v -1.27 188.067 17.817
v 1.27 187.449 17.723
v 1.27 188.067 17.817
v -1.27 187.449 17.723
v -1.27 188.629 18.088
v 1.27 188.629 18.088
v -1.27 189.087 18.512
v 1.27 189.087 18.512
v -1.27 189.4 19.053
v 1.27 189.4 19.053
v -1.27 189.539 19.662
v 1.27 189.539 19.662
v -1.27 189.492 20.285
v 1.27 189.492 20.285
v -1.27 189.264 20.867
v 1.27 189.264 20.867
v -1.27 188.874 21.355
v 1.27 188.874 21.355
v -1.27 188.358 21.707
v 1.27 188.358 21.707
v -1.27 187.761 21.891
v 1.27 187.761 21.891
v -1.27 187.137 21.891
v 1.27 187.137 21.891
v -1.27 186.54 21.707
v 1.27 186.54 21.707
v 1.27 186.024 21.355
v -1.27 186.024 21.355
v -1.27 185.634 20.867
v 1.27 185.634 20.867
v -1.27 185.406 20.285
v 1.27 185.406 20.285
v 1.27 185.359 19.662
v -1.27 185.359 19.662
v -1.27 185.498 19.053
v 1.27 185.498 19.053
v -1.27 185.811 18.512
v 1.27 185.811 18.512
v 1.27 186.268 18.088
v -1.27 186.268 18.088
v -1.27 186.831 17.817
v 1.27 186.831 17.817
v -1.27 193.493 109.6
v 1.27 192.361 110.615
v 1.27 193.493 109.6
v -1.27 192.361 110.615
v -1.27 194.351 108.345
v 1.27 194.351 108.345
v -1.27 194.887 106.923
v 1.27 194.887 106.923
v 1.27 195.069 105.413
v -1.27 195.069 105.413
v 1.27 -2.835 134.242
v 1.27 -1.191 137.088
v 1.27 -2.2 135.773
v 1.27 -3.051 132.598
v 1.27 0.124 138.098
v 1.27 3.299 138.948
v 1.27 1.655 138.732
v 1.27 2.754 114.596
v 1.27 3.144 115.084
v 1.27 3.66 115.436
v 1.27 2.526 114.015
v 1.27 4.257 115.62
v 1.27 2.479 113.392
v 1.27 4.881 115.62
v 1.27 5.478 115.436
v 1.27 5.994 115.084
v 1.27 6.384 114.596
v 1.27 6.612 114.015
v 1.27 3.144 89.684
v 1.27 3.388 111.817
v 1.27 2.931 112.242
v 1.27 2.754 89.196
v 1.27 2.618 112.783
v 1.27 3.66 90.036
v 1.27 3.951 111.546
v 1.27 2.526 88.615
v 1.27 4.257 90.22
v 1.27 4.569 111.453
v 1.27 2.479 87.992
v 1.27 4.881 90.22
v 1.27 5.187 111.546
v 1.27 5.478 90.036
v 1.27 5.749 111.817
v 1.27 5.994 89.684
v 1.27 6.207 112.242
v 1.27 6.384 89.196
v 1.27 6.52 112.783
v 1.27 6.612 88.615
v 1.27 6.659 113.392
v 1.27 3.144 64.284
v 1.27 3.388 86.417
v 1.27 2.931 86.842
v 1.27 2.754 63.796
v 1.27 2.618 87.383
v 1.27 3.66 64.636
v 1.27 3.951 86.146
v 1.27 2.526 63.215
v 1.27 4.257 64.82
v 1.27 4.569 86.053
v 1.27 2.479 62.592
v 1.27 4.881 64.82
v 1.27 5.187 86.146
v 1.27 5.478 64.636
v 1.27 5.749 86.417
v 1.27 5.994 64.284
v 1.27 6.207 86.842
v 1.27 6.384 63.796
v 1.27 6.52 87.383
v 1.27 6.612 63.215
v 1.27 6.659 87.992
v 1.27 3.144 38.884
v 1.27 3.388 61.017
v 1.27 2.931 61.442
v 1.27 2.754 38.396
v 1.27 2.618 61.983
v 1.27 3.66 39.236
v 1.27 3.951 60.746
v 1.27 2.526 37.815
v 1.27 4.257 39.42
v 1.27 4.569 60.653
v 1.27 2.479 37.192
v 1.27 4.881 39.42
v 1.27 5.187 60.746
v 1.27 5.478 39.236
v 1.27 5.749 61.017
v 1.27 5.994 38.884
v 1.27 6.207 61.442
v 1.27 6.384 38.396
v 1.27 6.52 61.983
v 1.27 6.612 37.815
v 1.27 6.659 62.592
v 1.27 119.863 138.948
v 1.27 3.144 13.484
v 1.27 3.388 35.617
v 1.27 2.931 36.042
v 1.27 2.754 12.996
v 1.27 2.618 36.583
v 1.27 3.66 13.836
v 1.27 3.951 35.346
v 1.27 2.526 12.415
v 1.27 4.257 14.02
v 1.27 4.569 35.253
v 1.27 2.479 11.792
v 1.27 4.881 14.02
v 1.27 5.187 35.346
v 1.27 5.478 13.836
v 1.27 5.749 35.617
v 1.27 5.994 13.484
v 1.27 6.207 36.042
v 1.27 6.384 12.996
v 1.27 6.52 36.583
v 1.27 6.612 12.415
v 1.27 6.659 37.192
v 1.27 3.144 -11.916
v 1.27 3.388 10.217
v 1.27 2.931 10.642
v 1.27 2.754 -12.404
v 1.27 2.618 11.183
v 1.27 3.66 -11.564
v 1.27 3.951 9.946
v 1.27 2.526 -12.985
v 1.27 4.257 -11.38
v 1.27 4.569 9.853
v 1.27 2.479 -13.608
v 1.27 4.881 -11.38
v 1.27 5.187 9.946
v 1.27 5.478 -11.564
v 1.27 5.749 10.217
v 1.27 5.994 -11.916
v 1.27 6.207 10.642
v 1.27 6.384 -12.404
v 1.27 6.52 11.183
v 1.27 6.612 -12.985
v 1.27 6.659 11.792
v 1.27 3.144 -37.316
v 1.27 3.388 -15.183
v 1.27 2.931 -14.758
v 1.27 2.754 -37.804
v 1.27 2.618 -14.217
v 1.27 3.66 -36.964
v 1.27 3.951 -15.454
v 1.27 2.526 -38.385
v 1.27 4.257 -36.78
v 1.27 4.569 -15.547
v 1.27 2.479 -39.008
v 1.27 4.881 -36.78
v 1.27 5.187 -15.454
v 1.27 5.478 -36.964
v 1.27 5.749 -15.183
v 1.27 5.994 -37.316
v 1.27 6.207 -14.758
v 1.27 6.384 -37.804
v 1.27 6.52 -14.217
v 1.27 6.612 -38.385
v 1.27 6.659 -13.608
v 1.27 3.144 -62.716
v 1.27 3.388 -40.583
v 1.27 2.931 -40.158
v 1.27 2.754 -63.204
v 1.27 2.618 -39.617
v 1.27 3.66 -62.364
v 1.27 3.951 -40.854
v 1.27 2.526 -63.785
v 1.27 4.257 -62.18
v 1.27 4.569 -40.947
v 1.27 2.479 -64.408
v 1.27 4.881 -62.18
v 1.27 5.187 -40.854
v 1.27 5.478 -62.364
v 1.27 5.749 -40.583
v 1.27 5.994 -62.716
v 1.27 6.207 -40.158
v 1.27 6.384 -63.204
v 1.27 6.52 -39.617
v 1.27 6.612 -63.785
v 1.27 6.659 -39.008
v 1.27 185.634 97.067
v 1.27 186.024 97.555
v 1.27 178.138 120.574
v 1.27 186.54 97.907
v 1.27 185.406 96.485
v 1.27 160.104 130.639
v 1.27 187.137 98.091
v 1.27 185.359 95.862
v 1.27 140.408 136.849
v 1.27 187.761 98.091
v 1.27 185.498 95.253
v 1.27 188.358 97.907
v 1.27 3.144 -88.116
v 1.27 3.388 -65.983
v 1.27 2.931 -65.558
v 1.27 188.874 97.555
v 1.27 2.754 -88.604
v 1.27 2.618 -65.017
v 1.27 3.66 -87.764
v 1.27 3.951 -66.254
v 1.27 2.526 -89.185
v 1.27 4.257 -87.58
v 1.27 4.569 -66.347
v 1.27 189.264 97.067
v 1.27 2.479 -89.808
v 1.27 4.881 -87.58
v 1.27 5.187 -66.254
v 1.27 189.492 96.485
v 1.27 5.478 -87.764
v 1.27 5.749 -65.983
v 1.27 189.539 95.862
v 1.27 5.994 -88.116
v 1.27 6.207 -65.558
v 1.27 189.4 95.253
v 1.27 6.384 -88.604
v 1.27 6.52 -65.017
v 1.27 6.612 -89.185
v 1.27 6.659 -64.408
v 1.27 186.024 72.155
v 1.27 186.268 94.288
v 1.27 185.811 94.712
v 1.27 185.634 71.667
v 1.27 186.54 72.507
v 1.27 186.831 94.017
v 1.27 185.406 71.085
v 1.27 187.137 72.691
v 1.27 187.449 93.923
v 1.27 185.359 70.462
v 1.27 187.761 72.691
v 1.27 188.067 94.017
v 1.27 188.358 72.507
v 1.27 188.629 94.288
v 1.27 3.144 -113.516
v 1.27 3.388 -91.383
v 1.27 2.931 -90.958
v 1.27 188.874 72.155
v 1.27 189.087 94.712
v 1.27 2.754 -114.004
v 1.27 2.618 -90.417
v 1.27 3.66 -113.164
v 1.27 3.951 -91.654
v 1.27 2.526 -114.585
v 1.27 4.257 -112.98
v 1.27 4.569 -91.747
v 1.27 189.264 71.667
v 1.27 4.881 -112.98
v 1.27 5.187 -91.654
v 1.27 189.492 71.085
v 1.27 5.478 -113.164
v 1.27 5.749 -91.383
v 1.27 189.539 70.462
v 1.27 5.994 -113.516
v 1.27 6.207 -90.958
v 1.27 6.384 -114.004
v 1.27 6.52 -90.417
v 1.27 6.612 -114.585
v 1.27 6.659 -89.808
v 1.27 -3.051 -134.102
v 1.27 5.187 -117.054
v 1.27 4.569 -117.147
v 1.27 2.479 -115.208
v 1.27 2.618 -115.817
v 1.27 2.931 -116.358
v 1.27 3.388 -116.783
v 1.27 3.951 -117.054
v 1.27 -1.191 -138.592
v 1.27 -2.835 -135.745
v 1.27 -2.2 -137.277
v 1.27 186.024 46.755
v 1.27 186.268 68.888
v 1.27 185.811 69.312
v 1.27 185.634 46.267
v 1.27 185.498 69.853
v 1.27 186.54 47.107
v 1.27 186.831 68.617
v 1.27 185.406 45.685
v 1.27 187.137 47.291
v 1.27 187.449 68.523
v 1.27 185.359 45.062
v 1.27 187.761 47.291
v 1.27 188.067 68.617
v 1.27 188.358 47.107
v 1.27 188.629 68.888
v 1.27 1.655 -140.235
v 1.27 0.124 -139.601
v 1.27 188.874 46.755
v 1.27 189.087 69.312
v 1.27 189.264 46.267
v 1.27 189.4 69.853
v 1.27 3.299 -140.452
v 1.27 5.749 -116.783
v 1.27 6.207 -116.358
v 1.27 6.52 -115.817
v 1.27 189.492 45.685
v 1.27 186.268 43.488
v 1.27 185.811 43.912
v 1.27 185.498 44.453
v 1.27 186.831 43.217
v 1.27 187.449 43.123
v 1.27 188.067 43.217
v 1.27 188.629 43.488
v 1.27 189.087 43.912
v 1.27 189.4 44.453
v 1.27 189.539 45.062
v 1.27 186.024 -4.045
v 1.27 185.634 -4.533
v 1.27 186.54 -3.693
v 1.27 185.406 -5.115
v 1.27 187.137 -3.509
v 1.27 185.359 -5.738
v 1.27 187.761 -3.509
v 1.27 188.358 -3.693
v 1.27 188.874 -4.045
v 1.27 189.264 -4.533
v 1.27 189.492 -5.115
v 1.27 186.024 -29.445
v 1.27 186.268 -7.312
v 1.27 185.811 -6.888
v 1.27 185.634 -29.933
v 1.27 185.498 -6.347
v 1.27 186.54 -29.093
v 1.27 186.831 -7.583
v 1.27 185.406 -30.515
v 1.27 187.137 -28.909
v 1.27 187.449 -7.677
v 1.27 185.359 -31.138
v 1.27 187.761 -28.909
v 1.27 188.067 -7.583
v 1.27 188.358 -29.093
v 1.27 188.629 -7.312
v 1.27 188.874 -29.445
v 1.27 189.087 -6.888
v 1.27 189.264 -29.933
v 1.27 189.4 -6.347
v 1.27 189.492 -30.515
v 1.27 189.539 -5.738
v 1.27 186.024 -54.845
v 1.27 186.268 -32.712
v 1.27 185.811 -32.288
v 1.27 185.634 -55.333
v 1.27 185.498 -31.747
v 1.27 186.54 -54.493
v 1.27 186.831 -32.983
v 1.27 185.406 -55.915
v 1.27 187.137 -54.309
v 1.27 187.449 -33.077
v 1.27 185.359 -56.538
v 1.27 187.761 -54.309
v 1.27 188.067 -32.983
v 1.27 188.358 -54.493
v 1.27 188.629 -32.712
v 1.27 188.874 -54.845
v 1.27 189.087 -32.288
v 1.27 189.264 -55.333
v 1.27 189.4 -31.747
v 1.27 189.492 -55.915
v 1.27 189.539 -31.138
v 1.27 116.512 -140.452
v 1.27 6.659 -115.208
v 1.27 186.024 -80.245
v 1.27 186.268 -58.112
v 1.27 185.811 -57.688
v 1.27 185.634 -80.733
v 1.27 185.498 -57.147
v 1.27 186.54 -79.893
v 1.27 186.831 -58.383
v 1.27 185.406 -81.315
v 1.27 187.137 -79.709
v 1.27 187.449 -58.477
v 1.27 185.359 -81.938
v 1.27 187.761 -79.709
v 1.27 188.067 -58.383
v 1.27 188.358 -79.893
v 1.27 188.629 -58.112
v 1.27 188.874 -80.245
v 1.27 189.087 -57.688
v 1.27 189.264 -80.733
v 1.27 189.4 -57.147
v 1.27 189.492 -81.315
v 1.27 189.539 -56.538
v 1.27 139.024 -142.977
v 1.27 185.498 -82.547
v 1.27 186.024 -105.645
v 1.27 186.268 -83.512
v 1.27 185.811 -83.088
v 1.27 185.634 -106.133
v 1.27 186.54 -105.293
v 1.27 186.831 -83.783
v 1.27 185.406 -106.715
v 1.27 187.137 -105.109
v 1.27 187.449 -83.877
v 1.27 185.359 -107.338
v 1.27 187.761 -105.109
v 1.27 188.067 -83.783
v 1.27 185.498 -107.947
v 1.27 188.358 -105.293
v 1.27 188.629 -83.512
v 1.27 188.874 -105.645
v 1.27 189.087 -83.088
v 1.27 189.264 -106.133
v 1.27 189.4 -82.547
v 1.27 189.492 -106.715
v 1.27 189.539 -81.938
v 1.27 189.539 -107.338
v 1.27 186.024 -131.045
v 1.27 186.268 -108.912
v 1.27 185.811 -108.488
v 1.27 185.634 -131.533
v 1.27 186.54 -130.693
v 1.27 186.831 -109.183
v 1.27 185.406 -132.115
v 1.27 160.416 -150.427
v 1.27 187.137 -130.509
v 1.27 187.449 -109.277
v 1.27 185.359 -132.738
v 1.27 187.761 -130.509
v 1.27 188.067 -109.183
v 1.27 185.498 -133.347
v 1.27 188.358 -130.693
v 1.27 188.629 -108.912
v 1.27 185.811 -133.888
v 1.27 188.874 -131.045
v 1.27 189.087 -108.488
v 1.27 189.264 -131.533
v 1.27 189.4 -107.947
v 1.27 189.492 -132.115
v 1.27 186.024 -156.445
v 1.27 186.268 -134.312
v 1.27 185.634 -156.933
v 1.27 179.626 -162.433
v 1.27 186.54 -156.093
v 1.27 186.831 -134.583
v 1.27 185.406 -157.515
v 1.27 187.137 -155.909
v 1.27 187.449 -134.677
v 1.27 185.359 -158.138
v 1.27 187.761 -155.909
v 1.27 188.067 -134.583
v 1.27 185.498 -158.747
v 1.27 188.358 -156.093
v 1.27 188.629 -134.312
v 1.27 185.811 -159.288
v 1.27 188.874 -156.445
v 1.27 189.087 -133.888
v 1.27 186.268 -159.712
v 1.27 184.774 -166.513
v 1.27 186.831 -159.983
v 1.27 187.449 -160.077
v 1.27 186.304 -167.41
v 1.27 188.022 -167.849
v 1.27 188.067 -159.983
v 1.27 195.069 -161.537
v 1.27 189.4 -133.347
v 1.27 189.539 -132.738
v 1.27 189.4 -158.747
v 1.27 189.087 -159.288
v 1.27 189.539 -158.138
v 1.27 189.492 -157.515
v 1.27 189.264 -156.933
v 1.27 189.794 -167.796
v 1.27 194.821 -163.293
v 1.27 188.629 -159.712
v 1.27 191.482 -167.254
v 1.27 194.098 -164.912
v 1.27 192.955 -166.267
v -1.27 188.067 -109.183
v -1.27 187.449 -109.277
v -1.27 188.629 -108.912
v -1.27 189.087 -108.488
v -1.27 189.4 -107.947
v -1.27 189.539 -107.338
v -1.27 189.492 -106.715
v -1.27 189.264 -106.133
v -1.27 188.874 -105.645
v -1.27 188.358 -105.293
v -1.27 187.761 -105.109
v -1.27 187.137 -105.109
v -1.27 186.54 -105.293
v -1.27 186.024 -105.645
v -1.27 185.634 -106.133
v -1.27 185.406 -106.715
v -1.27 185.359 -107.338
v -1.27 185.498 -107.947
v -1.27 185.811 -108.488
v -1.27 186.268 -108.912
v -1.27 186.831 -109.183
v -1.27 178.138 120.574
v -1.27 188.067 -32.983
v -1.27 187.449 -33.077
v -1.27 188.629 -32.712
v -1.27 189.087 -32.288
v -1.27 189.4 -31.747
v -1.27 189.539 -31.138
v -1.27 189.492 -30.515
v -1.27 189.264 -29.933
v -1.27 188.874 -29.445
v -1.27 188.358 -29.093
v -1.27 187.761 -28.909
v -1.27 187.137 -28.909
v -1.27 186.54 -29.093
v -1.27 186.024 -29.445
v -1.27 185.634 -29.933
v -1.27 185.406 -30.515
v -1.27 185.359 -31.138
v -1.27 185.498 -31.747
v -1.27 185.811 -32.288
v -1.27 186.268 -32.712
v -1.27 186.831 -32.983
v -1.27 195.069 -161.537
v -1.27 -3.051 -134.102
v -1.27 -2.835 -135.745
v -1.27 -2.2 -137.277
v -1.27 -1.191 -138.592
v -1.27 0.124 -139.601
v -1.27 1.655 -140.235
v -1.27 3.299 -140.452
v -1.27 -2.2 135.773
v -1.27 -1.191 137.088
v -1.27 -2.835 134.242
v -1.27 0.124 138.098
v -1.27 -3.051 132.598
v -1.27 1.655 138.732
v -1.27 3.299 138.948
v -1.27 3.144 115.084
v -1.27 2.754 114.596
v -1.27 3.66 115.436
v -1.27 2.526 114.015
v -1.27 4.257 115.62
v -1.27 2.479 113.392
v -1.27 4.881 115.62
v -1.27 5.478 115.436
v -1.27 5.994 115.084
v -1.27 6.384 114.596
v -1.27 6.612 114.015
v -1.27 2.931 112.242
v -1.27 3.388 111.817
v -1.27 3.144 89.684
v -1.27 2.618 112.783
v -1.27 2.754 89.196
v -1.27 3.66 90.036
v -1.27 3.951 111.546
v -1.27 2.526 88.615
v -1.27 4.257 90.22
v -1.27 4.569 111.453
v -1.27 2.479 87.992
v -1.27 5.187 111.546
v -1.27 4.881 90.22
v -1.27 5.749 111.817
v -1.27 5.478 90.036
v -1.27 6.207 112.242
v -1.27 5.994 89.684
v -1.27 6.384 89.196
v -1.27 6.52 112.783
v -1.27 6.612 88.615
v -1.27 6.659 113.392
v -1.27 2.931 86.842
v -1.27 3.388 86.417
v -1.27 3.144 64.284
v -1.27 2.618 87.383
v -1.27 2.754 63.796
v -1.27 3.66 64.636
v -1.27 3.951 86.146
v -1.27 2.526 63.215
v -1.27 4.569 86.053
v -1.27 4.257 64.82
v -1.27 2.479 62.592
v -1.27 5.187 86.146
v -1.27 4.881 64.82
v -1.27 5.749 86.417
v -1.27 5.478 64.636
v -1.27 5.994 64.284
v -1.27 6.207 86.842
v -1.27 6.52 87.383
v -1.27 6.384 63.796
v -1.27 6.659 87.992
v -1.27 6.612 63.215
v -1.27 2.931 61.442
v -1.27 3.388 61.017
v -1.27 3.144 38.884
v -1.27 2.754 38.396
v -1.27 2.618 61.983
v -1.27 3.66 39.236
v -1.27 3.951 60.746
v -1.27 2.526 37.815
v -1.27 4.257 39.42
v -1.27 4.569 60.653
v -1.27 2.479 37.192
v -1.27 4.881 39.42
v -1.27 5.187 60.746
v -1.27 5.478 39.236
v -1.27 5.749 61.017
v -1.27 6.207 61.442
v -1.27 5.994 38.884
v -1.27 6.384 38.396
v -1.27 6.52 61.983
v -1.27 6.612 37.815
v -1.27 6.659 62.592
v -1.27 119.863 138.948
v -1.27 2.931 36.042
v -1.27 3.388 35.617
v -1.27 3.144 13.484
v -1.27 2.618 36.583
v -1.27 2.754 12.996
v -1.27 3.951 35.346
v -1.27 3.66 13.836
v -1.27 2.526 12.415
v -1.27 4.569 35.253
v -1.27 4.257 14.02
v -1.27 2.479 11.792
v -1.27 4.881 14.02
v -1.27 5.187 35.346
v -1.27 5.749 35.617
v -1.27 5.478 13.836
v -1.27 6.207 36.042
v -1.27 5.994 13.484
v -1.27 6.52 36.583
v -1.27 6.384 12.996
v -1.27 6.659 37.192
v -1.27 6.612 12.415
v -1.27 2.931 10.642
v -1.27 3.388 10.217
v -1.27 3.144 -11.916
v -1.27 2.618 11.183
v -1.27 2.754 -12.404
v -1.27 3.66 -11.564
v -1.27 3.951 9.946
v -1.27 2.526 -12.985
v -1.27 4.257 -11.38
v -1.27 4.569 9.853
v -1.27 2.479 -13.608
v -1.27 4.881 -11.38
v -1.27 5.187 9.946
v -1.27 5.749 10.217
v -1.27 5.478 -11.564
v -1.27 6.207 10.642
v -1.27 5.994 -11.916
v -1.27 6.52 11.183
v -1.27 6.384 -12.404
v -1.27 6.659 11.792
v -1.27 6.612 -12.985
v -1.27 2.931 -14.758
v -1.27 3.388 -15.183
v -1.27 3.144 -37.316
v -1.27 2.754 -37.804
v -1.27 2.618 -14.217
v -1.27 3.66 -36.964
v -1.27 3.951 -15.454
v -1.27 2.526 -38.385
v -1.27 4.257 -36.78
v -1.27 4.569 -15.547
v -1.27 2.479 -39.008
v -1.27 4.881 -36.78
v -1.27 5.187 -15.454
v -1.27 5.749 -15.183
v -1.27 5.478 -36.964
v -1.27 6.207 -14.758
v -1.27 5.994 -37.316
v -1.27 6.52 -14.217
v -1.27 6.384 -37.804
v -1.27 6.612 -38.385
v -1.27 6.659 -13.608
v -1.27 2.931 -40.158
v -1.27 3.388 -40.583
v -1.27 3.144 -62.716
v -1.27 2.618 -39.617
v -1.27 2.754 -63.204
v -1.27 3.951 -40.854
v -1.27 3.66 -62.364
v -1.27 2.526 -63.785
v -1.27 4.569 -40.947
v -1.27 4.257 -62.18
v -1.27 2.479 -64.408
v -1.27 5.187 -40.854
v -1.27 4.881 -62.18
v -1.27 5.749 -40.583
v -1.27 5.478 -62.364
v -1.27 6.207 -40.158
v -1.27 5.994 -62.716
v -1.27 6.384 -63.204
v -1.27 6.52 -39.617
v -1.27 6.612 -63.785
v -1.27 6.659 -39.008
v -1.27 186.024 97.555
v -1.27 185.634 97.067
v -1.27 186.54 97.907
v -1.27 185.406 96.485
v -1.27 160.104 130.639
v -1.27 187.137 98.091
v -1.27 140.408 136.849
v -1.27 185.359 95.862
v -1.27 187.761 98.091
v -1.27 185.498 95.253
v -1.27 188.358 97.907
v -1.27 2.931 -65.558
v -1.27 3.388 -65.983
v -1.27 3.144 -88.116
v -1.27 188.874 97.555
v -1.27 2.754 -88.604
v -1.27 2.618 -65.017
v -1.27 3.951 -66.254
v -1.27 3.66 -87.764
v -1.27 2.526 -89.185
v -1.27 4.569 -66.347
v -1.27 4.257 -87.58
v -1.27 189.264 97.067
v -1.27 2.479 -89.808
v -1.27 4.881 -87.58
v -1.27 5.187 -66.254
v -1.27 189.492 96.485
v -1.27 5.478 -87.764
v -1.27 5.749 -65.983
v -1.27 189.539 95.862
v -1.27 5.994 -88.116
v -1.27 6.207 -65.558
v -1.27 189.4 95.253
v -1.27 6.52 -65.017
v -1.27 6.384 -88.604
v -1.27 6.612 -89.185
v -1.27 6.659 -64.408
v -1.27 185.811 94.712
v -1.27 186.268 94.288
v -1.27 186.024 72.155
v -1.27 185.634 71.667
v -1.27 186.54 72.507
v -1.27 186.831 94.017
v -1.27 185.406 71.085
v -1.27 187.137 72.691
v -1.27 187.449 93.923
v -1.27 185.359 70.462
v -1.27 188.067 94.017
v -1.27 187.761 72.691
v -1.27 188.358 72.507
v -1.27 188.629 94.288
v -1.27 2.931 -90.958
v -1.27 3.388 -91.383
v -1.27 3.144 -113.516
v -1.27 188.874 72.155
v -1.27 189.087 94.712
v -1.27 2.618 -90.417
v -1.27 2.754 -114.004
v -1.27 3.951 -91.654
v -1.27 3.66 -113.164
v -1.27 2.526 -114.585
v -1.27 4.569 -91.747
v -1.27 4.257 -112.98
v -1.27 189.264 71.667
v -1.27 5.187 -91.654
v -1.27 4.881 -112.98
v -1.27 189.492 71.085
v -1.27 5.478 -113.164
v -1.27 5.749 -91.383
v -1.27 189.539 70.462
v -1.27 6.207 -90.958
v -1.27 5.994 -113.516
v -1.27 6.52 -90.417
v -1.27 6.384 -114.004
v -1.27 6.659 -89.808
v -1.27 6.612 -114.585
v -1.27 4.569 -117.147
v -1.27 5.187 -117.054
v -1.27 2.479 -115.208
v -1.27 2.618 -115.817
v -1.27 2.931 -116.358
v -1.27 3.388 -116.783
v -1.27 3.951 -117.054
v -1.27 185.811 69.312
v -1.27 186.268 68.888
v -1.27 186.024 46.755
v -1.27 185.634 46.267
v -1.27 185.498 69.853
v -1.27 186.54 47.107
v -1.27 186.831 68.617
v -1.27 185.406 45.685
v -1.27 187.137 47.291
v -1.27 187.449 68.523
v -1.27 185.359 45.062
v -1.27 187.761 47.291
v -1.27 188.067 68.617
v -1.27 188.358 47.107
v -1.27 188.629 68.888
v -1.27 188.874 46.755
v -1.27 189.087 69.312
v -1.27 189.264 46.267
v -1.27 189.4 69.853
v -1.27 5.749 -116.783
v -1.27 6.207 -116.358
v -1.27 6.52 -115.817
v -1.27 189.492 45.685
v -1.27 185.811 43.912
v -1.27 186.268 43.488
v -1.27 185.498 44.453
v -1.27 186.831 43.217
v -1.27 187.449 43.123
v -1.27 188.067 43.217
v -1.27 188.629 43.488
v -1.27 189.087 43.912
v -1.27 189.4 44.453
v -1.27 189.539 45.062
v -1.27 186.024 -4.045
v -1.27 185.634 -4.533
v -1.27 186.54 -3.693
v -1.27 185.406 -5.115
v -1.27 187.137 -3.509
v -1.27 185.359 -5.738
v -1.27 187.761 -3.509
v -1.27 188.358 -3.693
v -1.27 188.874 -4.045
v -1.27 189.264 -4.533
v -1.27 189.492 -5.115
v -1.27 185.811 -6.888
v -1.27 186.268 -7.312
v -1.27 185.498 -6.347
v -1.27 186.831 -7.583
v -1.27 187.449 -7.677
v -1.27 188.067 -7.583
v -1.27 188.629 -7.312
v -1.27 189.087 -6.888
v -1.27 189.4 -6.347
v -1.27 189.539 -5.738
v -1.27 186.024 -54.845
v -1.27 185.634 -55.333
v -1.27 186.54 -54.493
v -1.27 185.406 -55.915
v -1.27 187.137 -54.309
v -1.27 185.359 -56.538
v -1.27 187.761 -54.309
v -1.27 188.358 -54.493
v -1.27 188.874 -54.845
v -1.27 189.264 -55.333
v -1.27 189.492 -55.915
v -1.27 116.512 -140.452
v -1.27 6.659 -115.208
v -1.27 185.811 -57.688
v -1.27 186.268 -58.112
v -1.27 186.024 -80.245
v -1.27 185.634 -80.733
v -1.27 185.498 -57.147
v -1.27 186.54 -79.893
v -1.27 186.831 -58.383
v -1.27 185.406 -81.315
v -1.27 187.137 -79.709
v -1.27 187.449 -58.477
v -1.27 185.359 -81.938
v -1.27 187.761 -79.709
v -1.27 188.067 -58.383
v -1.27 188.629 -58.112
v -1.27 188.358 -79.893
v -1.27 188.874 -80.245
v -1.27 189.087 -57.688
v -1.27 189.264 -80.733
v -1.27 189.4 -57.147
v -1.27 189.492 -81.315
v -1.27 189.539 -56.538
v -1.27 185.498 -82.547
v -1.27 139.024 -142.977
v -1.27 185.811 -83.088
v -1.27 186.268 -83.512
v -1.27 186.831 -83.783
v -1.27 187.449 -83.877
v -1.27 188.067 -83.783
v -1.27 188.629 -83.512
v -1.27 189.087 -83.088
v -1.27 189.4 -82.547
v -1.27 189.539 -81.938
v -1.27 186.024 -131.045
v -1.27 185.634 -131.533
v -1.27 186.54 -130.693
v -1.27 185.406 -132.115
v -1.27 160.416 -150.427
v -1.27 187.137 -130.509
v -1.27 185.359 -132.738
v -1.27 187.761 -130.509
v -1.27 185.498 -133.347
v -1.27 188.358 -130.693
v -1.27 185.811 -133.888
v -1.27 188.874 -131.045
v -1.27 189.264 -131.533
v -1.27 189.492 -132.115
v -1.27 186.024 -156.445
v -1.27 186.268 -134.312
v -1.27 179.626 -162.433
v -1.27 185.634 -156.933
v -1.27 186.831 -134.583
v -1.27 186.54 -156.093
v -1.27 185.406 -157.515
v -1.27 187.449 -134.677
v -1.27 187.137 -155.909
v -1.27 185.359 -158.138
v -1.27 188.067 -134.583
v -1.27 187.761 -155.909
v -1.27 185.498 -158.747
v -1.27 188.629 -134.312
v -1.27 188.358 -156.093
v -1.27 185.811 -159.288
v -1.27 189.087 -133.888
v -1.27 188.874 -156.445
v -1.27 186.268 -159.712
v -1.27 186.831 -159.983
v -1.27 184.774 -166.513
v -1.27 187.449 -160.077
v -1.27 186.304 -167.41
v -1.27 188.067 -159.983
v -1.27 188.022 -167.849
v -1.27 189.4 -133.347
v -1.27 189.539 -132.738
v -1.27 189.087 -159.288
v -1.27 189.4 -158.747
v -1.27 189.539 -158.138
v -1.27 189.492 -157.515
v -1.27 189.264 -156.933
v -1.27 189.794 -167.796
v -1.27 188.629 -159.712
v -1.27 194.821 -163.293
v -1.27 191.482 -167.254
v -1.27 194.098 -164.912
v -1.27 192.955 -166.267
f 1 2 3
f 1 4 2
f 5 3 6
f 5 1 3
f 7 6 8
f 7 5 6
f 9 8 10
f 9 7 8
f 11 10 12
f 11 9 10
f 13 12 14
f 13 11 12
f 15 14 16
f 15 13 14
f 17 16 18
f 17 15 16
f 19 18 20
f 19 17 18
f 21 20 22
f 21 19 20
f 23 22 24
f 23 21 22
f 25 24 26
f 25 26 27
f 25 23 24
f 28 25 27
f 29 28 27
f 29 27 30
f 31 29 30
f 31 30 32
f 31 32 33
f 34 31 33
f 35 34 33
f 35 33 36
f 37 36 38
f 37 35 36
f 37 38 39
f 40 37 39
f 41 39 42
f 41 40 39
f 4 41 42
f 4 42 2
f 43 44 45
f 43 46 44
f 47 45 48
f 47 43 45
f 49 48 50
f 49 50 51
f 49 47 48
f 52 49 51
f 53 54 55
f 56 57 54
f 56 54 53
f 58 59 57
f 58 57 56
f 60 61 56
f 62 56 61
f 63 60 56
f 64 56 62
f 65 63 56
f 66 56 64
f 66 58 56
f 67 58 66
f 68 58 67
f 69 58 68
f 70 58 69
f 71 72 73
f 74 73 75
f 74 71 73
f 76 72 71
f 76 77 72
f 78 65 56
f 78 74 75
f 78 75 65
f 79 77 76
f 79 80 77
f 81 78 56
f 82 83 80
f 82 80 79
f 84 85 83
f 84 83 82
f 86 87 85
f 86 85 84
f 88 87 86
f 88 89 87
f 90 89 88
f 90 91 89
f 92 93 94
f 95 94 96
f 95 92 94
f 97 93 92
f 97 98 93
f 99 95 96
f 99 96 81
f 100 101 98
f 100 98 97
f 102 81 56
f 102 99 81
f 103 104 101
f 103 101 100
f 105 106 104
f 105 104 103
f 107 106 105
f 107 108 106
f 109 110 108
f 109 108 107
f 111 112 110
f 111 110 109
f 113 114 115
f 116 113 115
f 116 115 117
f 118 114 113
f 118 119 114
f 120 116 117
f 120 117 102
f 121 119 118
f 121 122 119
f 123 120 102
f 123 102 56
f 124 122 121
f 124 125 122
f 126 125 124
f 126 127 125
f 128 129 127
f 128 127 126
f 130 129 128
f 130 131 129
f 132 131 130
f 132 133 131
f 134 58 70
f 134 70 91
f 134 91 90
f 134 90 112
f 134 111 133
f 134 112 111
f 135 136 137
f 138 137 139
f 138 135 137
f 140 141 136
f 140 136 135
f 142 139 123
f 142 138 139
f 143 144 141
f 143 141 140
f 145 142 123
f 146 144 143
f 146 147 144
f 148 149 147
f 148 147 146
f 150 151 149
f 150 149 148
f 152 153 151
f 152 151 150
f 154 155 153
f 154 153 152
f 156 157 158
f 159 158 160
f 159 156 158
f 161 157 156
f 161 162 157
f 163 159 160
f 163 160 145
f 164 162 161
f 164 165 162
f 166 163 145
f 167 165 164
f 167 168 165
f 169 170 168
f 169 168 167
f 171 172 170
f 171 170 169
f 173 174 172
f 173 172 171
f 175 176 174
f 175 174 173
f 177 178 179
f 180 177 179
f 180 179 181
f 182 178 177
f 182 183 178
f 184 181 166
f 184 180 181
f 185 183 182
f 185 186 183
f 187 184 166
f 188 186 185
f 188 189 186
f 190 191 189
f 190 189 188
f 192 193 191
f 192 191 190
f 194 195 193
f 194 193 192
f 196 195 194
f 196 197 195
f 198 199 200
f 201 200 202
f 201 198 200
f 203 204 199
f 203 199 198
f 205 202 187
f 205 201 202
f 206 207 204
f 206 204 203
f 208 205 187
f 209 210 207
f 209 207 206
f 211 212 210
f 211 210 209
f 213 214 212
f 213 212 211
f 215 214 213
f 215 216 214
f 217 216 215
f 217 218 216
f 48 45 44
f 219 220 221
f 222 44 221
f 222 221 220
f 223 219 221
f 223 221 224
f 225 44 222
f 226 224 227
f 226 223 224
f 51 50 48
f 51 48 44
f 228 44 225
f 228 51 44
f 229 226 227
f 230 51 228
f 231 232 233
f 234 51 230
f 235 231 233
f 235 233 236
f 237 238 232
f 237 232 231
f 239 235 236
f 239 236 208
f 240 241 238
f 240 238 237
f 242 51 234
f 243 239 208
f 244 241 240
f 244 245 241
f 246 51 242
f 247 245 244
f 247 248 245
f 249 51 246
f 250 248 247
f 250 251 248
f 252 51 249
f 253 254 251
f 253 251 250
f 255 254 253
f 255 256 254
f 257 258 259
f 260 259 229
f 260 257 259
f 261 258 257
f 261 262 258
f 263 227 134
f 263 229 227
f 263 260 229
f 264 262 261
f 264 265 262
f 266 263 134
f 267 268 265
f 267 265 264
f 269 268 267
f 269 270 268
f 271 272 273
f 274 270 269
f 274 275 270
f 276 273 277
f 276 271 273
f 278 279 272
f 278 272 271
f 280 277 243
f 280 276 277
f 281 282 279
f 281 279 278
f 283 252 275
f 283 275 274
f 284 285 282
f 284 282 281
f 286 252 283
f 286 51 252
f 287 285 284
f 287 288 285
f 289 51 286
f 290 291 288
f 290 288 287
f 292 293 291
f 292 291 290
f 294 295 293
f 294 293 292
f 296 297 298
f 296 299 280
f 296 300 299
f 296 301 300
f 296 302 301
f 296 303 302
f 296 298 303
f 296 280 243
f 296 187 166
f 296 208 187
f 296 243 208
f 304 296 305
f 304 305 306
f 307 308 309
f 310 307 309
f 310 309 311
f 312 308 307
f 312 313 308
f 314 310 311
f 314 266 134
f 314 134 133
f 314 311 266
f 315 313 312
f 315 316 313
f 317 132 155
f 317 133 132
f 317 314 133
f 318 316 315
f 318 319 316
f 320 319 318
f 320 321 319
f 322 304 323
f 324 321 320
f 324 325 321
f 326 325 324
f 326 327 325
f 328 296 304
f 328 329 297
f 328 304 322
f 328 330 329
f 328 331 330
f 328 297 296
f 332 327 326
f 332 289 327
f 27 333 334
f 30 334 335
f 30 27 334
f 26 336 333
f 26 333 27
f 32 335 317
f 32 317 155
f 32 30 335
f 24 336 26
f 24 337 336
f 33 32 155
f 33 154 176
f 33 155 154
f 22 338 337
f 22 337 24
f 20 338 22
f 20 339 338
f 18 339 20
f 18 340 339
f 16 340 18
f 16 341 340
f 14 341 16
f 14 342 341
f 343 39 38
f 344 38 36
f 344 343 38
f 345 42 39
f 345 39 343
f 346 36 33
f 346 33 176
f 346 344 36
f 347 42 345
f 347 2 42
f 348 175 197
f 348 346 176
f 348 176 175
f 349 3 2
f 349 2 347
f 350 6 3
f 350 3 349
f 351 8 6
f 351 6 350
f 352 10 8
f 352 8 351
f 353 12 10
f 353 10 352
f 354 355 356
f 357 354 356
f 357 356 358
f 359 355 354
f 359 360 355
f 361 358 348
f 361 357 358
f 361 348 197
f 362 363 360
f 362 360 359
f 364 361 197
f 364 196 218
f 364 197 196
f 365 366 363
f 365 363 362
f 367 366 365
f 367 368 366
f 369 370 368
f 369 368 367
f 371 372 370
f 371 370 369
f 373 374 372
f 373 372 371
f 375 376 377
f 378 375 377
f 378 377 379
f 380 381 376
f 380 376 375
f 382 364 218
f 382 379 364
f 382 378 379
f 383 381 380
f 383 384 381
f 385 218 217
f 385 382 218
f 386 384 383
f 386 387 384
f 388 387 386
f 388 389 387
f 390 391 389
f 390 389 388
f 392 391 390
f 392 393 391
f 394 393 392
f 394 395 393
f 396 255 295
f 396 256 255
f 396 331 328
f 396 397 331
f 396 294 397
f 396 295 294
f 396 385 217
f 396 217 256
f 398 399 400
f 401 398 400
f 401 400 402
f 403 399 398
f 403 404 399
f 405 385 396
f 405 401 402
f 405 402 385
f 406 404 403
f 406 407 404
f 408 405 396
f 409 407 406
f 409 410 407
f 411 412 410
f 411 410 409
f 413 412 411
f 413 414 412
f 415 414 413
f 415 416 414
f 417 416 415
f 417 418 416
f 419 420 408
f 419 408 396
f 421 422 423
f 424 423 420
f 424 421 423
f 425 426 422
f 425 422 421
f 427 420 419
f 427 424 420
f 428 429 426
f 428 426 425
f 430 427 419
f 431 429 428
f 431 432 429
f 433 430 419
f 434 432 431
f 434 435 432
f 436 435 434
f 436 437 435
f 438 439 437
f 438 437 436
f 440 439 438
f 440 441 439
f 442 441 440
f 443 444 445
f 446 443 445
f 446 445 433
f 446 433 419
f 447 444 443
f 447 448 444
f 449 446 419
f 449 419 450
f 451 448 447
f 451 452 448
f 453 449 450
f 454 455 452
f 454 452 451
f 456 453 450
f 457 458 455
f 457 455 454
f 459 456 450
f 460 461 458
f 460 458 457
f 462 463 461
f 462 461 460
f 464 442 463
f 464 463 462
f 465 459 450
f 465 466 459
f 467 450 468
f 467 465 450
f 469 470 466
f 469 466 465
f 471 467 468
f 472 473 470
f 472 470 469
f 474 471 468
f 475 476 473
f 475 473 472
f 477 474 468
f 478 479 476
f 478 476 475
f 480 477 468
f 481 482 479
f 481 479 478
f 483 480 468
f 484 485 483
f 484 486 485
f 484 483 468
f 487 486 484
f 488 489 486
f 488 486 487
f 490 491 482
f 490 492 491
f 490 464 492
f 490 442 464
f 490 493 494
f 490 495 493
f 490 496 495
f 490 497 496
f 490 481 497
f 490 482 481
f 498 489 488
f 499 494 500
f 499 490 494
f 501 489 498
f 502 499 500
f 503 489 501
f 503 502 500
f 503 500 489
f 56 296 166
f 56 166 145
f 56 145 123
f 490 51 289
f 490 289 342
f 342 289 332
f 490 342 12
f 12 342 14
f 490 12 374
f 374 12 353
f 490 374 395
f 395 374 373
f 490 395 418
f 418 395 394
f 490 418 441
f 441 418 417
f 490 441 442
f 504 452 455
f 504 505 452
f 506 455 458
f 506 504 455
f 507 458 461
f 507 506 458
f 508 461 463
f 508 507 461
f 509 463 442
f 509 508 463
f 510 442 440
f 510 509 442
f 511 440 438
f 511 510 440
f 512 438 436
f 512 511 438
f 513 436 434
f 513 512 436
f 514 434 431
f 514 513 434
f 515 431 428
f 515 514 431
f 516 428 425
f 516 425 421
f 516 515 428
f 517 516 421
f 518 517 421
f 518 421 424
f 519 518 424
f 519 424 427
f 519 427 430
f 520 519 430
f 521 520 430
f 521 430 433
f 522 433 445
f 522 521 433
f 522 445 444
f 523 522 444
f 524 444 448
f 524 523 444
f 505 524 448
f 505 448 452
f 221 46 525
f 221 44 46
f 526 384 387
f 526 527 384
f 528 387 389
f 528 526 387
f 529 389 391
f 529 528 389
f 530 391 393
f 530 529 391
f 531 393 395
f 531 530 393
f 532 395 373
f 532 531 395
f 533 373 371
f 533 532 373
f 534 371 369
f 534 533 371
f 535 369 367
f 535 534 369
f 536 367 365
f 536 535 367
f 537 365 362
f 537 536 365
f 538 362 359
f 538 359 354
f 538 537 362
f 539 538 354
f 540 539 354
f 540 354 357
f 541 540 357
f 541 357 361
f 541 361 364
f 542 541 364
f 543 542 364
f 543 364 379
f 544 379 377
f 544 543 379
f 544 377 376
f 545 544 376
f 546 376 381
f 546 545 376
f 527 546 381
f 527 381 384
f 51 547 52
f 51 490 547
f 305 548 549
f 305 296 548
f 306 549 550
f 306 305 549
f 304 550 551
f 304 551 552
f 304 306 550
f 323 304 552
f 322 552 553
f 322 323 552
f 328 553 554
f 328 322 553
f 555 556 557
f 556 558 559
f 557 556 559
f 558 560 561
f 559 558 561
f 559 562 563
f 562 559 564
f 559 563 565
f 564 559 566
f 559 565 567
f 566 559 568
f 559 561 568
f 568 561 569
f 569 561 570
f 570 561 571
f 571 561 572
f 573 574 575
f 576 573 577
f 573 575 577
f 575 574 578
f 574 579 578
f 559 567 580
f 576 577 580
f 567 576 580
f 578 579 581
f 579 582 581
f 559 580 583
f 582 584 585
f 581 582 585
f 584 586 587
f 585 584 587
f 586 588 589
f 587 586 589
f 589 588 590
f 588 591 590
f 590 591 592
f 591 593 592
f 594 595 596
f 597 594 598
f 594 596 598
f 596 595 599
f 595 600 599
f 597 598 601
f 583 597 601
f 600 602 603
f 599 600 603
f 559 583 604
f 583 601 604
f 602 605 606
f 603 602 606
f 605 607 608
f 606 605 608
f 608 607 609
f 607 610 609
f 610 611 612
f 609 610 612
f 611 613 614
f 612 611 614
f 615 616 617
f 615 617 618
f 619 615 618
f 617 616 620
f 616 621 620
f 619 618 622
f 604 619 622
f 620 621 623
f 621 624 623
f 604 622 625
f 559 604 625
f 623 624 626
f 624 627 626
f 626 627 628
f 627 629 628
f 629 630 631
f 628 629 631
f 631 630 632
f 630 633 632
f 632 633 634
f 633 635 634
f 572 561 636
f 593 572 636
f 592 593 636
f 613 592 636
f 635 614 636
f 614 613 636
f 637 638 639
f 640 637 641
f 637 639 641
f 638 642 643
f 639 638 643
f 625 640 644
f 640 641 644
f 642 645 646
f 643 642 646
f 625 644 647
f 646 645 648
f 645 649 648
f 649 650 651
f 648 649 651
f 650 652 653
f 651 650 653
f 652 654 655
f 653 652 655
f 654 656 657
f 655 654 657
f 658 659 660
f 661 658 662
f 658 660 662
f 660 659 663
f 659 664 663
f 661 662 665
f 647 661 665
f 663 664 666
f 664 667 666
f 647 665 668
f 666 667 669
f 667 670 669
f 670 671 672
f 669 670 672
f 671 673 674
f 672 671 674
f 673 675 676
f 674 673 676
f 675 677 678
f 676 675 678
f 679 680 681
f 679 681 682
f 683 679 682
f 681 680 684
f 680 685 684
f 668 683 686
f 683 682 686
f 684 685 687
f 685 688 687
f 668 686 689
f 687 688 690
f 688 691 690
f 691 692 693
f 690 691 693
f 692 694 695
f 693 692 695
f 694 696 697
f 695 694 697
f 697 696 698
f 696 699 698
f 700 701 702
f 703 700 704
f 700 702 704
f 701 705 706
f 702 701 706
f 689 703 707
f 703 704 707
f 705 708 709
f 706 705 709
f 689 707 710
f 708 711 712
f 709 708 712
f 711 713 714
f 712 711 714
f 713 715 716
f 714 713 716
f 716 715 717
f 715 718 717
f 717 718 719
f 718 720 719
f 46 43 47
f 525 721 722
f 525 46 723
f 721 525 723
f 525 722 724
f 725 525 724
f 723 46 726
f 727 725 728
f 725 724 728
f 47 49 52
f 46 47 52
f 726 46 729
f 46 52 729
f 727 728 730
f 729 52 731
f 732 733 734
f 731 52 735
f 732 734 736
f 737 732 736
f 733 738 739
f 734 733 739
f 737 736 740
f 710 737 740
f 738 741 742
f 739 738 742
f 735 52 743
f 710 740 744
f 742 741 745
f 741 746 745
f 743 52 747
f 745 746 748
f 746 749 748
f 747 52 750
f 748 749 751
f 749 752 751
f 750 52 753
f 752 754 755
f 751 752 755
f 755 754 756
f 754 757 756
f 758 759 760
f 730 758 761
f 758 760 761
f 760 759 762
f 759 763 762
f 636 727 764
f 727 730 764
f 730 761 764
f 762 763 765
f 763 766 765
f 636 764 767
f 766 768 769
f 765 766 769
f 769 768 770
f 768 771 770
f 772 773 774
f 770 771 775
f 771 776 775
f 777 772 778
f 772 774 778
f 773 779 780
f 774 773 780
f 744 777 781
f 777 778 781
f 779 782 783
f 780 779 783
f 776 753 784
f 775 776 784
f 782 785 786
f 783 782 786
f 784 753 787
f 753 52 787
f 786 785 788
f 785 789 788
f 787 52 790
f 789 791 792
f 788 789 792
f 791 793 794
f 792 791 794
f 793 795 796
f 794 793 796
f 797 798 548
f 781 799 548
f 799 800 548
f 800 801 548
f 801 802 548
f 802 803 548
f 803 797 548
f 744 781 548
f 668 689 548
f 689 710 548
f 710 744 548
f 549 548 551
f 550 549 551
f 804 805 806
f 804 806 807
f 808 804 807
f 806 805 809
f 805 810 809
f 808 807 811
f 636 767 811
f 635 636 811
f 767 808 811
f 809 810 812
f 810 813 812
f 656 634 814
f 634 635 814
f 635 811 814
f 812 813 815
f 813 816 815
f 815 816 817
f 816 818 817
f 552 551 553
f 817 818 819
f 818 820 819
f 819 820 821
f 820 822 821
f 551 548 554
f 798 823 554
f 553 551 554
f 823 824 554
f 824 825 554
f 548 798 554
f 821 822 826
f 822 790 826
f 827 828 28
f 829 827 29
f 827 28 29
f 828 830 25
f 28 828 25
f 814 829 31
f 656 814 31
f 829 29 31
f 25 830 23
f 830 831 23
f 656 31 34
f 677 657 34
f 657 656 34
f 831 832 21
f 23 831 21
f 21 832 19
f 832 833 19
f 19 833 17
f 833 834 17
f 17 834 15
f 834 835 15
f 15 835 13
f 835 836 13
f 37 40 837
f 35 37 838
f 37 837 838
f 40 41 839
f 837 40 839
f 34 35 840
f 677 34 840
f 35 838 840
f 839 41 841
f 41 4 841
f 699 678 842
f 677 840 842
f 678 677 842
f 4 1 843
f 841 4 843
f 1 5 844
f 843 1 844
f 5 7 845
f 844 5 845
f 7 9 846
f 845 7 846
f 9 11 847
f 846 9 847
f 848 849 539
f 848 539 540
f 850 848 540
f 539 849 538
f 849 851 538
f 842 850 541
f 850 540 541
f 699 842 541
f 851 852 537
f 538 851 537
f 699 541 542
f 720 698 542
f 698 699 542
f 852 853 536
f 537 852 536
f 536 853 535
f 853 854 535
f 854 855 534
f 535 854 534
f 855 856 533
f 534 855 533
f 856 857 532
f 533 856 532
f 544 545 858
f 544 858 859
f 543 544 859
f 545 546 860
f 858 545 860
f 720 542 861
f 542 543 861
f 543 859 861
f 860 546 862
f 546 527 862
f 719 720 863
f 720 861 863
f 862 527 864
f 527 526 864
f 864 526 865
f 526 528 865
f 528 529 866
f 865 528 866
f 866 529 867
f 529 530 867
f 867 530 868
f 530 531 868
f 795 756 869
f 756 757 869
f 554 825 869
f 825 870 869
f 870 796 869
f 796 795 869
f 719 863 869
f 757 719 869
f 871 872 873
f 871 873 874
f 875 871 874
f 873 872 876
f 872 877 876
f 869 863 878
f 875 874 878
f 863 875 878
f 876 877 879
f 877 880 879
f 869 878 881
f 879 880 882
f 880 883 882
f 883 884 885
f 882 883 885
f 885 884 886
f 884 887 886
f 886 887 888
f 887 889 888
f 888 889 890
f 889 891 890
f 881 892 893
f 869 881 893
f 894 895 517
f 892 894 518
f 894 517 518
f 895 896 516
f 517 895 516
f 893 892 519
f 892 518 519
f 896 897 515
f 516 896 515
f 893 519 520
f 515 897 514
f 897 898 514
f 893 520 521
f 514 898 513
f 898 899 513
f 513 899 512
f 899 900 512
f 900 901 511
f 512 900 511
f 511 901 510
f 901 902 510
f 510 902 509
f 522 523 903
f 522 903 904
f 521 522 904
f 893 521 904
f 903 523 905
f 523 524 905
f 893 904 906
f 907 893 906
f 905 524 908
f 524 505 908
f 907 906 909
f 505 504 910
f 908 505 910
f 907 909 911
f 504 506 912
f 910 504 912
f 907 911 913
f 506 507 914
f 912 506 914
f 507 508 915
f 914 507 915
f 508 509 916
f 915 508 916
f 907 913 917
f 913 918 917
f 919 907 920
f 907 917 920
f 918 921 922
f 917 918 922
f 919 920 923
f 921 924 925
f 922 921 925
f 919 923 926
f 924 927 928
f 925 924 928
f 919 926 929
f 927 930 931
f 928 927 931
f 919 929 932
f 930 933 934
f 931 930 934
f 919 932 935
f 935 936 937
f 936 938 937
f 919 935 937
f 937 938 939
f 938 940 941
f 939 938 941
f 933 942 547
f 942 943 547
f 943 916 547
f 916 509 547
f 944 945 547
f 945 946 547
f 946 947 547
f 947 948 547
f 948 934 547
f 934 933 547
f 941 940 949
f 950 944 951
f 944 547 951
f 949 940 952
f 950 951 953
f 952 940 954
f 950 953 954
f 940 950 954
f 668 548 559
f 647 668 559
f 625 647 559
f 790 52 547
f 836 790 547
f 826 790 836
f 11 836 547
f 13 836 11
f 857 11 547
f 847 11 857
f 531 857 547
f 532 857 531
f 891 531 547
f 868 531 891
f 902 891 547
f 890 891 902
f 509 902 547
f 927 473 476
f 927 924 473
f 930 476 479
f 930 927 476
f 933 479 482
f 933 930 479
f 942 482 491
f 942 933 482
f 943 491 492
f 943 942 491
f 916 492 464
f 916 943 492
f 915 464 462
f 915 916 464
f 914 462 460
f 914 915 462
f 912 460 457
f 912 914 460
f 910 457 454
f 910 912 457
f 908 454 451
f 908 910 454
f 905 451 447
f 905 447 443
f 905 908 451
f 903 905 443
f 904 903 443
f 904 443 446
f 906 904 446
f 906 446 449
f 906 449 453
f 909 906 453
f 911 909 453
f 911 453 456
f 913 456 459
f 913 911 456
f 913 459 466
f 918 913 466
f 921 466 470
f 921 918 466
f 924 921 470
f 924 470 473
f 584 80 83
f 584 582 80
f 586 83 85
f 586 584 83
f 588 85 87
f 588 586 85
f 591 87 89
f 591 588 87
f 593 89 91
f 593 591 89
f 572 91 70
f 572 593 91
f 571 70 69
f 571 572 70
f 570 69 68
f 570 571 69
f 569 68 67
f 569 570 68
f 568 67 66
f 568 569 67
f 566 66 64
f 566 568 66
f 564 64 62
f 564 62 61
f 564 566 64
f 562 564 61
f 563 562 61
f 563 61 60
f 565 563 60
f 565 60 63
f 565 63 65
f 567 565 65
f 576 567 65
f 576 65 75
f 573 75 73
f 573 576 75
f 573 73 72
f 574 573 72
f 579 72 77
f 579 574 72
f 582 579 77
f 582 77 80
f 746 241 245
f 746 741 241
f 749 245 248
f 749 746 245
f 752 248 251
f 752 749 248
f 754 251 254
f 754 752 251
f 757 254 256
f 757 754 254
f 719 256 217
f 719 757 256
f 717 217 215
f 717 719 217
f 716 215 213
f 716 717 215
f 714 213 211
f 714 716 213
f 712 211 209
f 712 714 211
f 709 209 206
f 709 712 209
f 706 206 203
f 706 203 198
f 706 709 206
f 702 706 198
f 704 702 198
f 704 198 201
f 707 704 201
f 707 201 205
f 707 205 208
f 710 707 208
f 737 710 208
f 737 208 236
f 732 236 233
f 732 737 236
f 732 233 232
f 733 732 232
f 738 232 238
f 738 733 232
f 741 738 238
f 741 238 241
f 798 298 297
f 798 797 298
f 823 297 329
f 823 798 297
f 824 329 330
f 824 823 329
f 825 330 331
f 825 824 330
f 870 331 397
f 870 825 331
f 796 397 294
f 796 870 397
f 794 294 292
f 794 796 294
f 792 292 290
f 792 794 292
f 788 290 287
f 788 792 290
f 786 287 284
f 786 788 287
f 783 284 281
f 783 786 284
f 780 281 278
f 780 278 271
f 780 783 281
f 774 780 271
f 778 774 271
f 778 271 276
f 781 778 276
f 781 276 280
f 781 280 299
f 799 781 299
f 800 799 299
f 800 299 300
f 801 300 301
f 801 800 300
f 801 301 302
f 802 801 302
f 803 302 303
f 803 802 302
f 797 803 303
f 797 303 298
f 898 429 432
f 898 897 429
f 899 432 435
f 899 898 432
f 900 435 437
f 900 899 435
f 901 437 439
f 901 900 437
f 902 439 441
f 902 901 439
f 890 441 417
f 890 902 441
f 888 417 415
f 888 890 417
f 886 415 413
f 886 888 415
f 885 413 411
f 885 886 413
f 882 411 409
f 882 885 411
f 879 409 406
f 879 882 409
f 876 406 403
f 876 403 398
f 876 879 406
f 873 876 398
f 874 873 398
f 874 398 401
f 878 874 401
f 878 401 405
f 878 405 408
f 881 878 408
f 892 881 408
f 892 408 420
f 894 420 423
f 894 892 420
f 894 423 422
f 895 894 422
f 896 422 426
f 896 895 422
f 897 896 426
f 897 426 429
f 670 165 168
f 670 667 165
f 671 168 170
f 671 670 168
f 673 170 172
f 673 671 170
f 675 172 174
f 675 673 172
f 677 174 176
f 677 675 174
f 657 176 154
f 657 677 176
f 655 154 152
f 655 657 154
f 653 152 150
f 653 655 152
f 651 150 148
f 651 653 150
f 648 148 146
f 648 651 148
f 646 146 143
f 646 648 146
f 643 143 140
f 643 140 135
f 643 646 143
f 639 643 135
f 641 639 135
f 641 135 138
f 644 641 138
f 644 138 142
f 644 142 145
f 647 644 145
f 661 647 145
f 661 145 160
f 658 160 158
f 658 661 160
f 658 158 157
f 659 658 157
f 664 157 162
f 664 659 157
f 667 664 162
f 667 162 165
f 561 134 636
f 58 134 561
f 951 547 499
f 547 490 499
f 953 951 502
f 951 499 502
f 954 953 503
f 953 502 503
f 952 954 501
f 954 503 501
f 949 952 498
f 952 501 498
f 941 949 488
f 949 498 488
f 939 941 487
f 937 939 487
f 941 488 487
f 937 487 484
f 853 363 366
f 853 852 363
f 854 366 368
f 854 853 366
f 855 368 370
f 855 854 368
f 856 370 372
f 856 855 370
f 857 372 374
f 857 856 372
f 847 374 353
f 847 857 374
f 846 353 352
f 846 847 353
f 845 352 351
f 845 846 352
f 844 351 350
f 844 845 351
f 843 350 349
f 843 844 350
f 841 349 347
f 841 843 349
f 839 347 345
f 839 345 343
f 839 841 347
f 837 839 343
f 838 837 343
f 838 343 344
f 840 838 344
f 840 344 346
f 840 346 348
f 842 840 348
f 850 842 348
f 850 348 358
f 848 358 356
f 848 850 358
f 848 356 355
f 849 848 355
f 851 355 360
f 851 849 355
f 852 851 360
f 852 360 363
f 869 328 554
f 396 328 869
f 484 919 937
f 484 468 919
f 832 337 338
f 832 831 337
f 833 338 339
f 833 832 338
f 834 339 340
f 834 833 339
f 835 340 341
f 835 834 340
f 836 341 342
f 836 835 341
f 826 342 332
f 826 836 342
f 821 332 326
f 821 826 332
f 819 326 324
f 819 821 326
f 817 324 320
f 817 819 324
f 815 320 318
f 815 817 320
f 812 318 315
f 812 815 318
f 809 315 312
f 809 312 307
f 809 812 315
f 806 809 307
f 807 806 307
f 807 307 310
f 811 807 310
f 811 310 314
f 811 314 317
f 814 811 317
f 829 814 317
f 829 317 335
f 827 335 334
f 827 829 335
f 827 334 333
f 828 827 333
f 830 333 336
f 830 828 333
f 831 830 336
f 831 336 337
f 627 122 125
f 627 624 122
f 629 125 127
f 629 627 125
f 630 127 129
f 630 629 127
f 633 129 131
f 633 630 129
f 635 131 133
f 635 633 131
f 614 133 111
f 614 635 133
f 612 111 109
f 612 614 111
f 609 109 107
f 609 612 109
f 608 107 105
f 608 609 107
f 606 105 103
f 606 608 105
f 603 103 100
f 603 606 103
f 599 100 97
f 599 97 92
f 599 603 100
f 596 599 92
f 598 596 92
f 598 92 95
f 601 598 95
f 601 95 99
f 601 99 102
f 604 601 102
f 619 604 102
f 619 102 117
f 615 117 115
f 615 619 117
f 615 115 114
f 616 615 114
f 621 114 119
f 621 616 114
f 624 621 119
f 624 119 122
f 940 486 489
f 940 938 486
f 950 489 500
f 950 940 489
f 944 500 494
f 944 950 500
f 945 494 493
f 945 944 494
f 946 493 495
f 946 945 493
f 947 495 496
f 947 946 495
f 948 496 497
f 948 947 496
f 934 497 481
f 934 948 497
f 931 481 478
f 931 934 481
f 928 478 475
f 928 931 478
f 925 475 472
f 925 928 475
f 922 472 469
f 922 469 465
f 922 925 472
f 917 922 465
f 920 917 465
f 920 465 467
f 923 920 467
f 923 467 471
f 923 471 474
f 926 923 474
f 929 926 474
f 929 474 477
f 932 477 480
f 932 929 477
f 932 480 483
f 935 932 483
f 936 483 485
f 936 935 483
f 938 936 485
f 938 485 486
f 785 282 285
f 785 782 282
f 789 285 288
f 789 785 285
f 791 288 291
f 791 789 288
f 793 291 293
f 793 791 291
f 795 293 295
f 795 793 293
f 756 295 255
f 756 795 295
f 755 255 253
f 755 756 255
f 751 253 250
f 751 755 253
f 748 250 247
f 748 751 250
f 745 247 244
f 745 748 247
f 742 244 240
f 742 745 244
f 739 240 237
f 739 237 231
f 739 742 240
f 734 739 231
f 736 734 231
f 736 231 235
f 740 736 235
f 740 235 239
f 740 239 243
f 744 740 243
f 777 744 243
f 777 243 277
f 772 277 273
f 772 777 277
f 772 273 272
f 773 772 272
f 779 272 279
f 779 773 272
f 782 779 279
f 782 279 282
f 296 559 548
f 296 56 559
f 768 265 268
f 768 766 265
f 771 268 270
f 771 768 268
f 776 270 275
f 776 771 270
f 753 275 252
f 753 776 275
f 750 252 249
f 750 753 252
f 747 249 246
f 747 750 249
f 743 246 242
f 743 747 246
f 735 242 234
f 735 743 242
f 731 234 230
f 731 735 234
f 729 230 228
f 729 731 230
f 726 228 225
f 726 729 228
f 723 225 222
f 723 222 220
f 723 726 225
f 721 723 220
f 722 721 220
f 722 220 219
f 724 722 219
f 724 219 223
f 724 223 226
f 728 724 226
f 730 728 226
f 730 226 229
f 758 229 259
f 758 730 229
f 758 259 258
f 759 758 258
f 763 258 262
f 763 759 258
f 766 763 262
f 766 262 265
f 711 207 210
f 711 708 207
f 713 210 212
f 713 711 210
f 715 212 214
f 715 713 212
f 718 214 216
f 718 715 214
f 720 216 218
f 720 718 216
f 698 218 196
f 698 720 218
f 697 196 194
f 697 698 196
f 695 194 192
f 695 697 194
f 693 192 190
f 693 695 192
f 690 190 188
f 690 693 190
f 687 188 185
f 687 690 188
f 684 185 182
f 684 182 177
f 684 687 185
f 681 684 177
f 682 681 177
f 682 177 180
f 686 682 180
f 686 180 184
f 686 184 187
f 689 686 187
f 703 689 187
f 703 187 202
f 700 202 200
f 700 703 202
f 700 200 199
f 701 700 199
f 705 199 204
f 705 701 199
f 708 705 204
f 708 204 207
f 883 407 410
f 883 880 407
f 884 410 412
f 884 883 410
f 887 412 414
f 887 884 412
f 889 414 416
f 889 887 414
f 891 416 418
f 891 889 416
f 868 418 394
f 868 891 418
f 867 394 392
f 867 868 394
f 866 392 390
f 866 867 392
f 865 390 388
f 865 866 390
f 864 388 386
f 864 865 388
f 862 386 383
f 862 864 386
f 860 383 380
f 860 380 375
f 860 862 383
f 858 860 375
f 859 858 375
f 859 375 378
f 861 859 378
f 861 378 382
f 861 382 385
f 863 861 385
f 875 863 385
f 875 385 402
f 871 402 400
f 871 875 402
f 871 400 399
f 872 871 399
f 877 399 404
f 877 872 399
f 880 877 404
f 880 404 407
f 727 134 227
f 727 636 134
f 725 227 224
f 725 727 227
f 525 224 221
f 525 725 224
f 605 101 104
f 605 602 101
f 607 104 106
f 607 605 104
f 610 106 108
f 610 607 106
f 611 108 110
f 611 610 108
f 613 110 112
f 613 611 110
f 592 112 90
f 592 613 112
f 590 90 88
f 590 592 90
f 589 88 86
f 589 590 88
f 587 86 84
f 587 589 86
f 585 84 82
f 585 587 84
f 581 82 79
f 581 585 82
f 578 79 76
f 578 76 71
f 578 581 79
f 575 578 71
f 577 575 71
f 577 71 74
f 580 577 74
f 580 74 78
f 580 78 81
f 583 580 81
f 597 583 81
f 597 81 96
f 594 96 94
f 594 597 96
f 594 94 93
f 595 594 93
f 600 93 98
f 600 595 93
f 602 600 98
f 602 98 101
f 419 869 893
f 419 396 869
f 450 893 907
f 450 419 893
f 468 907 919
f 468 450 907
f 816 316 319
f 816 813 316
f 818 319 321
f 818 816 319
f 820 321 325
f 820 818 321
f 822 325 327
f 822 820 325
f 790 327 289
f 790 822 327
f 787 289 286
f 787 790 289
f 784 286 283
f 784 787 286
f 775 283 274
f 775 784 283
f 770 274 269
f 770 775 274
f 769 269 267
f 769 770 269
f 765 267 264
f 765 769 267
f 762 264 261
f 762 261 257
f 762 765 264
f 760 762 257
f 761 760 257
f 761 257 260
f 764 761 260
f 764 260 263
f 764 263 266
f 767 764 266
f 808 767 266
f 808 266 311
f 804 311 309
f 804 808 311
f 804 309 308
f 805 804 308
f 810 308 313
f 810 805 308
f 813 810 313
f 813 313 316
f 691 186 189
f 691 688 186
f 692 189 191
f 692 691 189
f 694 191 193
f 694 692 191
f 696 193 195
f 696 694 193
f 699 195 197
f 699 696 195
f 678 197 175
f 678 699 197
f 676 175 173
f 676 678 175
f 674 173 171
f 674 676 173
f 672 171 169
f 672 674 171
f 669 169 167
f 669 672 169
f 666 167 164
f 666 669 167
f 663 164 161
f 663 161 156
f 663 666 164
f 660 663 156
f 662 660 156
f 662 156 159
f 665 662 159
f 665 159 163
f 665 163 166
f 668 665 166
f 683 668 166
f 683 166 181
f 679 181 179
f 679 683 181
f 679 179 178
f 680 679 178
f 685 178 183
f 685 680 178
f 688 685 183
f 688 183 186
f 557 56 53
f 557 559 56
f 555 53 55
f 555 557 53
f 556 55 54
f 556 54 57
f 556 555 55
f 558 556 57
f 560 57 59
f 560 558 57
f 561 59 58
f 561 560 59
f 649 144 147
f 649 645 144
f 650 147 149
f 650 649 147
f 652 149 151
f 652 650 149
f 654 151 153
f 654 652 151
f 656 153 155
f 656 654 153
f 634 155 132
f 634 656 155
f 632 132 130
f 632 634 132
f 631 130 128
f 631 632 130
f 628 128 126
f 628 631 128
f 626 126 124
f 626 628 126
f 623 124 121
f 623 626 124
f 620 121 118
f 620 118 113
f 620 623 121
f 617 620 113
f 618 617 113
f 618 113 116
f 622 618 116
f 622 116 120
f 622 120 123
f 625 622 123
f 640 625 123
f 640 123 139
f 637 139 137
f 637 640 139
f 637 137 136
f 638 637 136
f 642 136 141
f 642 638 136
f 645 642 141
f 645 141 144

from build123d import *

# Parameters (mm, degrees)
SKETCH1_R           = 2.0955
BOSS_EXTRUDE1_DEPTH = 1.27
FILLET1_R           = 6.35
FILLET2_R           = 101.6


with BuildPart() as part:
    # Sketch1 → Boss-Extrude1 (new, symmetric)
    with BuildSketch(Plane(origin=(0, 0, 0), x_dir=(0, 0, -1), z_dir=(1, 0, 0))):
        Polygon((-138.948360469, -3.051094372), (140.451639531, -3.051094372), (140.451639531, 151.896865158), (174.673969175, 195.068905628), (-108.718972293, 195.068905628), (-138.948360469, 151.896865158), align=None)
        with Locations((-113.548360469, 4.568905628)):
            Circle(SKETCH1_R, mode=Mode.SUBTRACT)
        with Locations((-88.148360469, 4.568905628)):
            Circle(SKETCH1_R, mode=Mode.SUBTRACT)
        with Locations((-62.748360469, 4.568905628)):
            Circle(SKETCH1_R, mode=Mode.SUBTRACT)
        with Locations((-37.348360469, 4.568905628)):
            Circle(SKETCH1_R, mode=Mode.SUBTRACT)
        with Locations((-11.948360469, 4.568905628)):
            Circle(SKETCH1_R, mode=Mode.SUBTRACT)
        with Locations((13.451639531, 4.568905628)):
            Circle(SKETCH1_R, mode=Mode.SUBTRACT)
        with Locations((38.851639531, 4.568905628)):
            Circle(SKETCH1_R, mode=Mode.SUBTRACT)
        with Locations((64.251639531, 4.568905628)):
            Circle(SKETCH1_R, mode=Mode.SUBTRACT)
        with Locations((89.651639531, 4.568905628)):
            Circle(SKETCH1_R, mode=Mode.SUBTRACT)
        with Locations((115.051639531, 4.568905628)):
            Circle(SKETCH1_R, mode=Mode.SUBTRACT)
        with Locations((-96.018972293, 187.448905628)):
            Circle(SKETCH1_R, mode=Mode.SUBTRACT)
        with Locations((-70.618972293, 187.448905628)):
            Circle(SKETCH1_R, mode=Mode.SUBTRACT)
        with Locations((-45.218972293, 187.448905628)):
            Circle(SKETCH1_R, mode=Mode.SUBTRACT)
        with Locations((-19.818972293, 187.448905628)):
            Circle(SKETCH1_R, mode=Mode.SUBTRACT)
        with Locations((5.581027707, 187.448905628)):
            Circle(SKETCH1_R, mode=Mode.SUBTRACT)
        with Locations((30.981027707, 187.448905628)):
            Circle(SKETCH1_R, mode=Mode.SUBTRACT)
        with Locations((56.381027707, 187.448905628)):
            Circle(SKETCH1_R, mode=Mode.SUBTRACT)
        with Locations((81.781027707, 187.448905628)):
            Circle(SKETCH1_R, mode=Mode.SUBTRACT)
        with Locations((107.181027707, 187.448905628)):
            Circle(SKETCH1_R, mode=Mode.SUBTRACT)
        with Locations((132.581027707, 187.448905628)):
            Circle(SKETCH1_R, mode=Mode.SUBTRACT)
        with Locations((157.981027707, 187.448905628)):
            Circle(SKETCH1_R, mode=Mode.SUBTRACT)
    extrude(amount=BOSS_EXTRUDE1_DEPTH, both=True)

    # Fillet1
    fillet1_edges = [part.edges().sort_by_distance(p)[0] for p in [
        (0, -3.051094372, -140.451639531),
        (0, -3.051094372, 138.948360469),
        (0, 195.068905628, 108.718972293),
        (0, 195.068905628, -174.673969175),
    ]]
    fillet(fillet1_edges, radius=FILLET1_R)

    # Fillet2
    fillet2_edges = [part.edges().sort_by_distance(p)[0] for p in [
        (0, 151.896865158, -140.451639531),
        (0, 151.896865158, 138.948360469),
    ]]
    fillet(fillet2_edges, radius=FILLET2_R)


solid = part.part
